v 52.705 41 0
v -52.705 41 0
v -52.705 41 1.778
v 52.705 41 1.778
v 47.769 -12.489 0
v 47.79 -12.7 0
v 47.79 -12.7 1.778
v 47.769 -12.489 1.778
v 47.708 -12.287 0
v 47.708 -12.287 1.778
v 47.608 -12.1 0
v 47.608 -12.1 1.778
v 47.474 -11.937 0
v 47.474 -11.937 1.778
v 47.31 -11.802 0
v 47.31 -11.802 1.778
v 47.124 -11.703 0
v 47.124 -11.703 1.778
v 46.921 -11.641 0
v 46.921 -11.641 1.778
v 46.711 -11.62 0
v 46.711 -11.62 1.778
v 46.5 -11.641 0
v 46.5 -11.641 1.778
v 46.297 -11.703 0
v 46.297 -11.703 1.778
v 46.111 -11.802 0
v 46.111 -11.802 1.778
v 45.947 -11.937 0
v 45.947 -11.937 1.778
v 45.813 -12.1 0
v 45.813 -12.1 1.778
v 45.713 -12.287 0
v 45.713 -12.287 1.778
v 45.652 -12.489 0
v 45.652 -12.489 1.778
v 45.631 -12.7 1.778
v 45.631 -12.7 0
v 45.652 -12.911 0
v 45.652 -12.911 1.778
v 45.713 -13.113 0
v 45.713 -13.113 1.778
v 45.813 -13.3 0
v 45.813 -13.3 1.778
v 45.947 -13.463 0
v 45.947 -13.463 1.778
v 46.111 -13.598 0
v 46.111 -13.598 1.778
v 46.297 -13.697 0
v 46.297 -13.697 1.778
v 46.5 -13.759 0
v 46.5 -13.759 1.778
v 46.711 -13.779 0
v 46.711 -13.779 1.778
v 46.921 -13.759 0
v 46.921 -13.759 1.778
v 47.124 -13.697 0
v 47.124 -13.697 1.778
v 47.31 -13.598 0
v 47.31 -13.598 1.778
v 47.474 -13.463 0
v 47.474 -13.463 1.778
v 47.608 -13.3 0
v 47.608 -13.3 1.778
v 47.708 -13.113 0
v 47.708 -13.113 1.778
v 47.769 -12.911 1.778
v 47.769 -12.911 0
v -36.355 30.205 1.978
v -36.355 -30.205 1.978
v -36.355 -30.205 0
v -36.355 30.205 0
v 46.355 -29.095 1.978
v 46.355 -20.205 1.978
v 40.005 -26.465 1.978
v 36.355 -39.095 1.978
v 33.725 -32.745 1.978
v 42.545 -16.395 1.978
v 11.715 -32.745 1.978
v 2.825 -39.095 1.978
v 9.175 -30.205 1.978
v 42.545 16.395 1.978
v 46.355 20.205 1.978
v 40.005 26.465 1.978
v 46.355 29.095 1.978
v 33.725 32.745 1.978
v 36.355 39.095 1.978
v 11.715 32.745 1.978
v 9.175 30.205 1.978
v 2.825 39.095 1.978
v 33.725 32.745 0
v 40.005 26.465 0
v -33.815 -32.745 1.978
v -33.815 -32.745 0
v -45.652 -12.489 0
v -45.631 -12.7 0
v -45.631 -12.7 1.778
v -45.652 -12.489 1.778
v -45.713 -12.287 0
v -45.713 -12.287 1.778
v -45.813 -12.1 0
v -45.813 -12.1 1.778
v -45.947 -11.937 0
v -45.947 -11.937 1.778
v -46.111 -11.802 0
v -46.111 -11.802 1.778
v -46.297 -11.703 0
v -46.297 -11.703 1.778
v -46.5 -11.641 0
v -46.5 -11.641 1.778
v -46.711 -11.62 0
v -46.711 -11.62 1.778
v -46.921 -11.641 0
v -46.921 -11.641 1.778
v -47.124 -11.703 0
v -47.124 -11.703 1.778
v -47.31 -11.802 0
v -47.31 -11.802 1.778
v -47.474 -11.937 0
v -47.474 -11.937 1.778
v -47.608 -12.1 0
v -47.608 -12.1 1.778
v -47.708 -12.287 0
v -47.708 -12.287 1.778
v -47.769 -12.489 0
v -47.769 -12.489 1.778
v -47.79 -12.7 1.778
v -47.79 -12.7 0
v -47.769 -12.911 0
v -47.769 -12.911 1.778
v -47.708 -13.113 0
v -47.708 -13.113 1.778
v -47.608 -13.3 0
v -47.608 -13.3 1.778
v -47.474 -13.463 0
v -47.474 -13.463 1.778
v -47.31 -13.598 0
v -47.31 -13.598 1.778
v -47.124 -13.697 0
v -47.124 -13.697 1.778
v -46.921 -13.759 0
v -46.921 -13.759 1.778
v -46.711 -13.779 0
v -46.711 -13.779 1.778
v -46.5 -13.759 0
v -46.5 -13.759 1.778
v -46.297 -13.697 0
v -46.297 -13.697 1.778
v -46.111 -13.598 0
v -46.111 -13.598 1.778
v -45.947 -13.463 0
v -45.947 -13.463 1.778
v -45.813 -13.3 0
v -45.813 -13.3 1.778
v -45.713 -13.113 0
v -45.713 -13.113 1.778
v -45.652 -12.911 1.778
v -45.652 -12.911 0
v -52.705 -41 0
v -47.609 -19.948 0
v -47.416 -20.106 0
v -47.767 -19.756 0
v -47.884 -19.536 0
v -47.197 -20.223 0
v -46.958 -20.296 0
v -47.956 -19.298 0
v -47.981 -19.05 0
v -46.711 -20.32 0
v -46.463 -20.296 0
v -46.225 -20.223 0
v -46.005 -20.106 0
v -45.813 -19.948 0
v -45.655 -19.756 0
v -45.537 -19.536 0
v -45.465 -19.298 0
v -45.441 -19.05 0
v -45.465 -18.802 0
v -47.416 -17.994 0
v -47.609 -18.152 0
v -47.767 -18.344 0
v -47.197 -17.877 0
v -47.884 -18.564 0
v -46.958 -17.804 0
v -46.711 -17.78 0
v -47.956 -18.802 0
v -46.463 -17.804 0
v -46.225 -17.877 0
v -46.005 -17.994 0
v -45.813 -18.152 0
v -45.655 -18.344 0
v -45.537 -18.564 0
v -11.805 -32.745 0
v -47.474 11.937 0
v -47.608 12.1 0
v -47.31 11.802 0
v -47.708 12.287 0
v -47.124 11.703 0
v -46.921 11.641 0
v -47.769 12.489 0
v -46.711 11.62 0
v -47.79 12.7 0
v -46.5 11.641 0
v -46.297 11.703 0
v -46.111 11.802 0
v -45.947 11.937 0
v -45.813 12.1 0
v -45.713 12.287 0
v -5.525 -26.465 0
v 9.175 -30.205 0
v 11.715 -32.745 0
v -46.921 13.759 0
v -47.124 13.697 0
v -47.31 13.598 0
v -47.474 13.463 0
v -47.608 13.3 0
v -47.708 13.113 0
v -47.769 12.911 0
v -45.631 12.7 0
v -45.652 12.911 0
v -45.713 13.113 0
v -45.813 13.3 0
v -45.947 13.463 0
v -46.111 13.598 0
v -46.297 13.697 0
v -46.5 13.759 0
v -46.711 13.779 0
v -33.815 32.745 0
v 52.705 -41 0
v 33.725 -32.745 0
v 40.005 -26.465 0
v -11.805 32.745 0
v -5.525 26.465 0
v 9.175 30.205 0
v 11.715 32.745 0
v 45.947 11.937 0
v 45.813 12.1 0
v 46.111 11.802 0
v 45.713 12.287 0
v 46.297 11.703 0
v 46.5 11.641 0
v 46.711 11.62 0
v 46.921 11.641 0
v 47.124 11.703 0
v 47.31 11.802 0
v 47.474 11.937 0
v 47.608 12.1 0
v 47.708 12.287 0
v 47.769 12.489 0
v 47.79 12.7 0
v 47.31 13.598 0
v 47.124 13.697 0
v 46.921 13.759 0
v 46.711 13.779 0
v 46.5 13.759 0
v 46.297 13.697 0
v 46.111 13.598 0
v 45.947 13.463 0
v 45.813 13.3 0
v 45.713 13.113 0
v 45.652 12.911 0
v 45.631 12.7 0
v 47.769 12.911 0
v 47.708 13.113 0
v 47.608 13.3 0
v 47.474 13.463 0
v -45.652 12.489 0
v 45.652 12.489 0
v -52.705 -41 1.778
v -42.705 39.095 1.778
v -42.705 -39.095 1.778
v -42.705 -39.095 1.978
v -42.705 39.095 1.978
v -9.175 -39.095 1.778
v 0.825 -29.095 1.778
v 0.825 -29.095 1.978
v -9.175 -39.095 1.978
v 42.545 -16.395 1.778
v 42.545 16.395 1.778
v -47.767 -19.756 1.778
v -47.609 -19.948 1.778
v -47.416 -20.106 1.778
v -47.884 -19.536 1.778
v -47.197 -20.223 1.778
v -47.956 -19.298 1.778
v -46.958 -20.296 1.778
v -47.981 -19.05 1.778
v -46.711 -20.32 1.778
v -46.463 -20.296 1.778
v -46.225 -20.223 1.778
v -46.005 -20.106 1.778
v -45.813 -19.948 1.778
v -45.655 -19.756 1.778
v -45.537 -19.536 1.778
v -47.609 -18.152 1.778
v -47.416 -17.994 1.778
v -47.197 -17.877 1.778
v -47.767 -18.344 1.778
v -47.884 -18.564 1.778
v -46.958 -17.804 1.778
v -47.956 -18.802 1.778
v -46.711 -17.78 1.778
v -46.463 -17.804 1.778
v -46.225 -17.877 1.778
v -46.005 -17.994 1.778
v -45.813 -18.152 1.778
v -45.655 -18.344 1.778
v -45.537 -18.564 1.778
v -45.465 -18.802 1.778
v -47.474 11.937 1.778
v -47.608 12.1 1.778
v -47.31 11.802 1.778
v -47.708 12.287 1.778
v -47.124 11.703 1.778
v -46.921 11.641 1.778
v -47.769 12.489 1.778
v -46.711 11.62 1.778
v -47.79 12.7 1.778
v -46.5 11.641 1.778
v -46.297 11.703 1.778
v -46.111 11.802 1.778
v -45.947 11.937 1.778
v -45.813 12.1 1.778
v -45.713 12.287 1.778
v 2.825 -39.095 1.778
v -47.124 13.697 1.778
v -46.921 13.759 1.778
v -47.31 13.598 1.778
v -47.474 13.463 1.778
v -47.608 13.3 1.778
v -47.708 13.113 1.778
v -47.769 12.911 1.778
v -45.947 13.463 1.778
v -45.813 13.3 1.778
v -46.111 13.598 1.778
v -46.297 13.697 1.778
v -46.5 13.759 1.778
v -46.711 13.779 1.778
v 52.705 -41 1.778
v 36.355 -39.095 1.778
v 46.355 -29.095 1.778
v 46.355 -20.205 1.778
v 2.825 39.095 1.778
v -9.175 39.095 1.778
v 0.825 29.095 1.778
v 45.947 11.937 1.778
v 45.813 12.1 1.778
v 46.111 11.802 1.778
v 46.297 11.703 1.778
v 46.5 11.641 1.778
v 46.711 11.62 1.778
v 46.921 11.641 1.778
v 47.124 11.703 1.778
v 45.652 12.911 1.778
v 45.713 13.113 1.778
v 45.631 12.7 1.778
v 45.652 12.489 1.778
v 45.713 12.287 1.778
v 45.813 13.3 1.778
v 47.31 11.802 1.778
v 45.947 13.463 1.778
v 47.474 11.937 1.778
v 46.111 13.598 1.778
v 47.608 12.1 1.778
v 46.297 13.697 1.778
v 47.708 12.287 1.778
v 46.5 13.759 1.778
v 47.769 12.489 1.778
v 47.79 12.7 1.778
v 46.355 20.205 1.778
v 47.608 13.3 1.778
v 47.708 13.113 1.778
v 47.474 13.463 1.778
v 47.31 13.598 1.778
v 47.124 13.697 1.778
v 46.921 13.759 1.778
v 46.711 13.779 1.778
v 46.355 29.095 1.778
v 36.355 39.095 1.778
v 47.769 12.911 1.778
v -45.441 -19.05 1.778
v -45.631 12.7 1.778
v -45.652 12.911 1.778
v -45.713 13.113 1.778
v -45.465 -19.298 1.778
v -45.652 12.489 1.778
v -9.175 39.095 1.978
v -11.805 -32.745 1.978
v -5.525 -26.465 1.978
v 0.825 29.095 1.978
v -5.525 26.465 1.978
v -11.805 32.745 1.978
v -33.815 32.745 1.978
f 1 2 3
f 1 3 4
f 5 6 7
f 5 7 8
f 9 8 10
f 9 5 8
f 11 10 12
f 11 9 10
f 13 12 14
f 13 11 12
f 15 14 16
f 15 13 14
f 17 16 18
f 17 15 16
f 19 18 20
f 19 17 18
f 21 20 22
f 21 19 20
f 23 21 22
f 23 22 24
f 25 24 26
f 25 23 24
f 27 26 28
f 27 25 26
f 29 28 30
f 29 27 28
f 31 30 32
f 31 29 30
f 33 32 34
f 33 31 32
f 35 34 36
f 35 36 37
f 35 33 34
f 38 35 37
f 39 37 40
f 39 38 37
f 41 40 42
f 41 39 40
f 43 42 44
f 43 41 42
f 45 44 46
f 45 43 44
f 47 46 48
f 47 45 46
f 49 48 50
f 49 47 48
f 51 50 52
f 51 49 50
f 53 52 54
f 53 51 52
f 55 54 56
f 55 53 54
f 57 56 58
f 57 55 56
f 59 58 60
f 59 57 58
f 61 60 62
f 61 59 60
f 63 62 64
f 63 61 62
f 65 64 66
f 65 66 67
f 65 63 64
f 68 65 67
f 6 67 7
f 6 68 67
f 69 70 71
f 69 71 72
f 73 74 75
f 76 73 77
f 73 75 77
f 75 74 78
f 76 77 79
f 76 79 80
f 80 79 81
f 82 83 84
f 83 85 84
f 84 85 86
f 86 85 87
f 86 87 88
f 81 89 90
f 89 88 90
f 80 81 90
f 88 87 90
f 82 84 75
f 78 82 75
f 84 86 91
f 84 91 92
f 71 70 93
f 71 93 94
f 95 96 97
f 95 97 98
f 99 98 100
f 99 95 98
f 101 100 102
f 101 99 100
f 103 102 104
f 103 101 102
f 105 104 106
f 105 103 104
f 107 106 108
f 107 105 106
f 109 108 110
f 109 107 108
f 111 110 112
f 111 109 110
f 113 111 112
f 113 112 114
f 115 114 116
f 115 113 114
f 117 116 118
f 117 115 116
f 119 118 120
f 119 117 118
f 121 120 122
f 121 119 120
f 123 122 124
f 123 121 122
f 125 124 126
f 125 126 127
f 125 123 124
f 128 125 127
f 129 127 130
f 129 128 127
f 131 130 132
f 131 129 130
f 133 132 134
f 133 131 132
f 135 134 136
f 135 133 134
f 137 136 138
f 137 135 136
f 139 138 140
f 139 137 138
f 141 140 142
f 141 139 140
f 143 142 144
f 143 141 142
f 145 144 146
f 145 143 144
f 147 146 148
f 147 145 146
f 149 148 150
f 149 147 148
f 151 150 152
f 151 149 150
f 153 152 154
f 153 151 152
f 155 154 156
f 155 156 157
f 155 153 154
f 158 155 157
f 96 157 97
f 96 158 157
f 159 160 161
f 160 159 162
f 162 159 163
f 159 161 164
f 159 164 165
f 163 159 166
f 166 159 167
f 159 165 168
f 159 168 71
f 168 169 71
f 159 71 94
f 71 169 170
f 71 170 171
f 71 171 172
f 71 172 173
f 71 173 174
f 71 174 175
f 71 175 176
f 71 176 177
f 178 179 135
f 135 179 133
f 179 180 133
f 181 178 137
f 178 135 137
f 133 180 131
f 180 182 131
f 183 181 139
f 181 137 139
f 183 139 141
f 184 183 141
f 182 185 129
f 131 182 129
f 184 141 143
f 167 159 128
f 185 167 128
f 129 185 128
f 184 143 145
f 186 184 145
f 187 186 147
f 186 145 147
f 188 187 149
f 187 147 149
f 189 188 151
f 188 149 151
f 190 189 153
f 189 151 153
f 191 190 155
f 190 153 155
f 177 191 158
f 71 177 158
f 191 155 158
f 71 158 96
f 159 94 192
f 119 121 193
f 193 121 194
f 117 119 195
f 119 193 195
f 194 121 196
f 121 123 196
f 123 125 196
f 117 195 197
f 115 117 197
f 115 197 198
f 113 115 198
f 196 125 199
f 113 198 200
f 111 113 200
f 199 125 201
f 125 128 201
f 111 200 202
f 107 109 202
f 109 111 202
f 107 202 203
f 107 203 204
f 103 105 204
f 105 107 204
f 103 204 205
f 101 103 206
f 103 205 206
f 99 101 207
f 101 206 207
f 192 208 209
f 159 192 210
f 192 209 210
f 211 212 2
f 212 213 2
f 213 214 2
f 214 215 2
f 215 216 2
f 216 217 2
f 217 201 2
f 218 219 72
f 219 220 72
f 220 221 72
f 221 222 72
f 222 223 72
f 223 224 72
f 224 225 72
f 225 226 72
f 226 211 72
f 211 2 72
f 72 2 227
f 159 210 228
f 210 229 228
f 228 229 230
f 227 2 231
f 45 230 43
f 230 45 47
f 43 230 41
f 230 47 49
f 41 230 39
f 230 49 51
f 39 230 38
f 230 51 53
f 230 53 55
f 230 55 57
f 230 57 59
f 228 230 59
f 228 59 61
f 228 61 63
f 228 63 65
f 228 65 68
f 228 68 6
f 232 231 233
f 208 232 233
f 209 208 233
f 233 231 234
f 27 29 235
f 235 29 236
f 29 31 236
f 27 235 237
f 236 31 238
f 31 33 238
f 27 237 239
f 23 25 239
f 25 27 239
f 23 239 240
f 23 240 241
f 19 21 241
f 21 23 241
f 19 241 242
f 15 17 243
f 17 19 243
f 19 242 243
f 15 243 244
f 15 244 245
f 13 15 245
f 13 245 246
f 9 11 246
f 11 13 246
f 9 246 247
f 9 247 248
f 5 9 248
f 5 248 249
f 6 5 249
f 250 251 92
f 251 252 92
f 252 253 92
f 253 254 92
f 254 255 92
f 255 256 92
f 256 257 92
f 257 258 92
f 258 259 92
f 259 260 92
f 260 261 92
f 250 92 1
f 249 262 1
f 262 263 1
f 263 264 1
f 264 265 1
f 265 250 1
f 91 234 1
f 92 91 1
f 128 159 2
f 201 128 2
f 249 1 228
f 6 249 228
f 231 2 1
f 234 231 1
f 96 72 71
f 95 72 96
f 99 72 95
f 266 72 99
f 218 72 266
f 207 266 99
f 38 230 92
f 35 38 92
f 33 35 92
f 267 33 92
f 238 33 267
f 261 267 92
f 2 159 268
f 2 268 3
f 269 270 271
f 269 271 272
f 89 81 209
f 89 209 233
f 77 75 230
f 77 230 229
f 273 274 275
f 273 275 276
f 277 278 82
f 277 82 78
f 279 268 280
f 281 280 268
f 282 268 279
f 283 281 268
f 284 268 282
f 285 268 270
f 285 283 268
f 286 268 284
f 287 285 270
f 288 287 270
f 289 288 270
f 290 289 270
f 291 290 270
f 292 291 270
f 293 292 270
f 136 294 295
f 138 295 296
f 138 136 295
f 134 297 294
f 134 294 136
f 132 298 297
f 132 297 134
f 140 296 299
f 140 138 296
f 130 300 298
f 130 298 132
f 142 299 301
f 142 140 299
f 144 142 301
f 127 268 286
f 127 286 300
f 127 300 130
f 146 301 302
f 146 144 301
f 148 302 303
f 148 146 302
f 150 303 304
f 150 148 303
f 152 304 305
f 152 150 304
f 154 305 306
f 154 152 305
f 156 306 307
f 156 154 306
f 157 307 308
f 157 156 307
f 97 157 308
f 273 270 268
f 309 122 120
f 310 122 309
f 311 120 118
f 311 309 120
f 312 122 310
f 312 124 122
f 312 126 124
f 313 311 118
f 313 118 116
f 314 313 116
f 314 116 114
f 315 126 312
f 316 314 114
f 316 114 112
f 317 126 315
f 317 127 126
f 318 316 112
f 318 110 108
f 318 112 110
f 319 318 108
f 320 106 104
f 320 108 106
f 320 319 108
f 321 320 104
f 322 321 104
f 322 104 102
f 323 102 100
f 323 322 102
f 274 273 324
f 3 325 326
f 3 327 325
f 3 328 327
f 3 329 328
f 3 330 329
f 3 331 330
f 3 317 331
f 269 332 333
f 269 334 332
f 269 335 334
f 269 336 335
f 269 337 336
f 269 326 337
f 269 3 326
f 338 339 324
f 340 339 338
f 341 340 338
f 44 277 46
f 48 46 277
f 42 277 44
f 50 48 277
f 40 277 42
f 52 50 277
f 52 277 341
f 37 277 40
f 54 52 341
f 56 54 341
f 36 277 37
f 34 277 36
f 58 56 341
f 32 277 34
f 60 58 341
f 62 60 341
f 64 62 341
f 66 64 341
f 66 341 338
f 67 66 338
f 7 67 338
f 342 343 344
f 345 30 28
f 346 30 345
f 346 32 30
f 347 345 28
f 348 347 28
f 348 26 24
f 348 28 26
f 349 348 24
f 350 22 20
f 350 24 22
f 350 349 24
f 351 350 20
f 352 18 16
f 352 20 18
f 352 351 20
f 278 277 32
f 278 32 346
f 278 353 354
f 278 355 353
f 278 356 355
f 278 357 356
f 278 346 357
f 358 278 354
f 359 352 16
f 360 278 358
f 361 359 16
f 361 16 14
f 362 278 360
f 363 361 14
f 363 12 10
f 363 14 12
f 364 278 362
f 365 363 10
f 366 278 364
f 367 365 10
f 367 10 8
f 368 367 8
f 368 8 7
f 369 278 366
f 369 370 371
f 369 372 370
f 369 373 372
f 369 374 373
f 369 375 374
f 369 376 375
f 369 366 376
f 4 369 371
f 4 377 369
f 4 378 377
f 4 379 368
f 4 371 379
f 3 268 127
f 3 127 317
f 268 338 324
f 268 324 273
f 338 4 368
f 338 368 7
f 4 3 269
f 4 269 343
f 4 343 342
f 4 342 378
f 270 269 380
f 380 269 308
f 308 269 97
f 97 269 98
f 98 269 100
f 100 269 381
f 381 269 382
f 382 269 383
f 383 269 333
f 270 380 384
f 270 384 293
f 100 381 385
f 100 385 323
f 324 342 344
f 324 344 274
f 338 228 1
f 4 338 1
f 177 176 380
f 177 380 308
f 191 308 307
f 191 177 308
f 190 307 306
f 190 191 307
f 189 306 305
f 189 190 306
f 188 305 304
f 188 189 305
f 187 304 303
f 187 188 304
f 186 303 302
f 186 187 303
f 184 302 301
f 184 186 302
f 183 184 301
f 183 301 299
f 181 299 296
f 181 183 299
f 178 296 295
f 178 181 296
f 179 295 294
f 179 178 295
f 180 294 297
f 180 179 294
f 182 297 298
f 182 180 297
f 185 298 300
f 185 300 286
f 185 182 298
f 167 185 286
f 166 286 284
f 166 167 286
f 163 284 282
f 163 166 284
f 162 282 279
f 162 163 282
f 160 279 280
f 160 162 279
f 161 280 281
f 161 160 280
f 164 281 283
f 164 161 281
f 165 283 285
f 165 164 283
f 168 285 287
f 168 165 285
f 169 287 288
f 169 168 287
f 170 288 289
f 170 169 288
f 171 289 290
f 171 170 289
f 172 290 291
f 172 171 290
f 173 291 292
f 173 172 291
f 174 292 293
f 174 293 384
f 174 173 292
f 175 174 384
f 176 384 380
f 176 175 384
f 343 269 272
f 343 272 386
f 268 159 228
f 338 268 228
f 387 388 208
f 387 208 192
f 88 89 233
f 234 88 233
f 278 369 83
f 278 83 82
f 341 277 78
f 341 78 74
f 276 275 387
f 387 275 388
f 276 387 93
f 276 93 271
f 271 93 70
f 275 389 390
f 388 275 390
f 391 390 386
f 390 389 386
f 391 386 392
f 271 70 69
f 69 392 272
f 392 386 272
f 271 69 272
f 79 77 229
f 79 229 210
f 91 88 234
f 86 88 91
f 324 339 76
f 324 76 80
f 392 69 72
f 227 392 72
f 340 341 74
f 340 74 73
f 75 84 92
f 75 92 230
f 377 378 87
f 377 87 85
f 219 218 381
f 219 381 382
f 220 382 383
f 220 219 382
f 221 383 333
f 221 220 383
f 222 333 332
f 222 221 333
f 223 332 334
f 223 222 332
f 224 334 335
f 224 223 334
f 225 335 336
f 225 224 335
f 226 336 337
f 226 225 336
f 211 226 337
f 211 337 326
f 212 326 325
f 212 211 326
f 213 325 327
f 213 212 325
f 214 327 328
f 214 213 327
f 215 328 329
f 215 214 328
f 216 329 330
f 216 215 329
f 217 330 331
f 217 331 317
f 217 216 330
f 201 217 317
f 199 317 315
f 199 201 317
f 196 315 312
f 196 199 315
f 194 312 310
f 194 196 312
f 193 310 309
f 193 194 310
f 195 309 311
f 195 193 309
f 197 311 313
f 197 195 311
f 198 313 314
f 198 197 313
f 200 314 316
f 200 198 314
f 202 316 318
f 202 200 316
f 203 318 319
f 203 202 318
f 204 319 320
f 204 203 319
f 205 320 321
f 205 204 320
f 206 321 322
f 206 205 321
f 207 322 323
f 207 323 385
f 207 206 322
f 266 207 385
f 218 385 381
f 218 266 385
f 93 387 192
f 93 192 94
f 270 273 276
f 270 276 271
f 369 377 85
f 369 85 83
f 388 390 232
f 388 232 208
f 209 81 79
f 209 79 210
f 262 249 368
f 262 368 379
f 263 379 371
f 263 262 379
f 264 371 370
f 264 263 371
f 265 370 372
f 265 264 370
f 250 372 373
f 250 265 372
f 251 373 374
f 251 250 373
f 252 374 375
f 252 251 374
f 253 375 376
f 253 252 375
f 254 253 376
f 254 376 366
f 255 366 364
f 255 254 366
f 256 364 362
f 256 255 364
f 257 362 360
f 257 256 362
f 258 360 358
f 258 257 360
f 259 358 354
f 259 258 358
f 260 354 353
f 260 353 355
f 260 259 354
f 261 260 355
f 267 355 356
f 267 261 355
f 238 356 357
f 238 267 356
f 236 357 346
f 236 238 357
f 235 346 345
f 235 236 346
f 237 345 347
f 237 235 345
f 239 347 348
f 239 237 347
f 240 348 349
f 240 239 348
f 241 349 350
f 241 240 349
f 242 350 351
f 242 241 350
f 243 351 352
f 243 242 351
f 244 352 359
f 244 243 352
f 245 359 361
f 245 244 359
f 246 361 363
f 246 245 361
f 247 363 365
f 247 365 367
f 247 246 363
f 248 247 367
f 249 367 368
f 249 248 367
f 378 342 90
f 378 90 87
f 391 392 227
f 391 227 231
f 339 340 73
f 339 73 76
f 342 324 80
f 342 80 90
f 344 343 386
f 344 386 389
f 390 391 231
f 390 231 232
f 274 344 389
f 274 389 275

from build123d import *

# Parameters (mm, degrees)
SKETCH1_W           = 105.41
SKETCH1_H           = 82
SKETCH1_R           = 1.0795
SKETCH1_R_2         = 1.27
BOSS_EXTRUDE1_DEPTH = 1.778
BOSS_EXTRUDE2_DEPTH = 0.2
CUT_EXTRUDE1_DEPTH  = 2.978
CHAMFER1_SIZE       = 2.54


with BuildPart() as part:
    # Sketch1 → Boss-Extrude1 (new body)
    with BuildSketch(Plane.XY):
        Rectangle(SKETCH1_W, SKETCH1_H)
        with Locations((46.7106, 12.7)):
            Circle(SKETCH1_R, mode=Mode.SUBTRACT)
        with Locations((46.7106, -12.7)):
            Circle(SKETCH1_R, mode=Mode.SUBTRACT)
        with Locations((-46.7106, 12.7)):
            Circle(SKETCH1_R, mode=Mode.SUBTRACT)
        with Locations((-46.7106, -12.7)):
            Circle(SKETCH1_R, mode=Mode.SUBTRACT)
        with Locations((-46.7106, -19.05)):
            Circle(SKETCH1_R_2, mode=Mode.SUBTRACT)
    extrude(amount=BOSS_EXTRUDE1_DEPTH)

    # Sketch2 → Boss-Extrude2 (add)
    with BuildSketch(Plane.XY.offset(1.778)):
        Polygon((-9.175, 39.095), (0.825, 29.095), (0.825, -29.095), (-9.175, -39.095), (-42.705, -39.095), (-42.705, 39.095), align=None)
        Polygon((46.355, 20.205), (42.545, 16.395), (42.545, -16.395), (46.355, -20.205), (46.355, -29.095), (36.355, -39.095), (2.825, -39.095), (2.825, 39.095), (36.355, 39.095), (46.355, 29.095), align=None)
    extrude(amount=BOSS_EXTRUDE2_DEPTH)

    # Sketch3 → Cut-Extrude1 (cut, through all)
    with BuildSketch(Plane.XY.offset(1.978)):
        Polygon((-36.355, -32.745), (-36.355, 32.745), (-11.805256121, 32.745), (-5.525, 26.464743879), (-5.525, -26.464743879), (-11.805256121, -32.745), align=None)
        Polygon((9.175, -32.745), (9.175, 32.745), (33.724743879, 32.745), (40.005, 26.464743879), (40.005, -26.464743879), (33.724743879, -32.745), align=None)
    extrude(amount=-CUT_EXTRUDE1_DEPTH, mode=Mode.SUBTRACT)

    # Chamfer1
    chamfer1_edges = [part.edges().sort_by_distance(p)[0] for p in [
        (-36.355, -32.745, 0.989),
        (-36.355, 32.745, 0.989),
        (9.175, -32.745, 0.989),
        (9.175, 32.745, 0.989),
    ]]
    chamfer(chamfer1_edges, length=CHAMFER1_SIZE)


solid = part.part
